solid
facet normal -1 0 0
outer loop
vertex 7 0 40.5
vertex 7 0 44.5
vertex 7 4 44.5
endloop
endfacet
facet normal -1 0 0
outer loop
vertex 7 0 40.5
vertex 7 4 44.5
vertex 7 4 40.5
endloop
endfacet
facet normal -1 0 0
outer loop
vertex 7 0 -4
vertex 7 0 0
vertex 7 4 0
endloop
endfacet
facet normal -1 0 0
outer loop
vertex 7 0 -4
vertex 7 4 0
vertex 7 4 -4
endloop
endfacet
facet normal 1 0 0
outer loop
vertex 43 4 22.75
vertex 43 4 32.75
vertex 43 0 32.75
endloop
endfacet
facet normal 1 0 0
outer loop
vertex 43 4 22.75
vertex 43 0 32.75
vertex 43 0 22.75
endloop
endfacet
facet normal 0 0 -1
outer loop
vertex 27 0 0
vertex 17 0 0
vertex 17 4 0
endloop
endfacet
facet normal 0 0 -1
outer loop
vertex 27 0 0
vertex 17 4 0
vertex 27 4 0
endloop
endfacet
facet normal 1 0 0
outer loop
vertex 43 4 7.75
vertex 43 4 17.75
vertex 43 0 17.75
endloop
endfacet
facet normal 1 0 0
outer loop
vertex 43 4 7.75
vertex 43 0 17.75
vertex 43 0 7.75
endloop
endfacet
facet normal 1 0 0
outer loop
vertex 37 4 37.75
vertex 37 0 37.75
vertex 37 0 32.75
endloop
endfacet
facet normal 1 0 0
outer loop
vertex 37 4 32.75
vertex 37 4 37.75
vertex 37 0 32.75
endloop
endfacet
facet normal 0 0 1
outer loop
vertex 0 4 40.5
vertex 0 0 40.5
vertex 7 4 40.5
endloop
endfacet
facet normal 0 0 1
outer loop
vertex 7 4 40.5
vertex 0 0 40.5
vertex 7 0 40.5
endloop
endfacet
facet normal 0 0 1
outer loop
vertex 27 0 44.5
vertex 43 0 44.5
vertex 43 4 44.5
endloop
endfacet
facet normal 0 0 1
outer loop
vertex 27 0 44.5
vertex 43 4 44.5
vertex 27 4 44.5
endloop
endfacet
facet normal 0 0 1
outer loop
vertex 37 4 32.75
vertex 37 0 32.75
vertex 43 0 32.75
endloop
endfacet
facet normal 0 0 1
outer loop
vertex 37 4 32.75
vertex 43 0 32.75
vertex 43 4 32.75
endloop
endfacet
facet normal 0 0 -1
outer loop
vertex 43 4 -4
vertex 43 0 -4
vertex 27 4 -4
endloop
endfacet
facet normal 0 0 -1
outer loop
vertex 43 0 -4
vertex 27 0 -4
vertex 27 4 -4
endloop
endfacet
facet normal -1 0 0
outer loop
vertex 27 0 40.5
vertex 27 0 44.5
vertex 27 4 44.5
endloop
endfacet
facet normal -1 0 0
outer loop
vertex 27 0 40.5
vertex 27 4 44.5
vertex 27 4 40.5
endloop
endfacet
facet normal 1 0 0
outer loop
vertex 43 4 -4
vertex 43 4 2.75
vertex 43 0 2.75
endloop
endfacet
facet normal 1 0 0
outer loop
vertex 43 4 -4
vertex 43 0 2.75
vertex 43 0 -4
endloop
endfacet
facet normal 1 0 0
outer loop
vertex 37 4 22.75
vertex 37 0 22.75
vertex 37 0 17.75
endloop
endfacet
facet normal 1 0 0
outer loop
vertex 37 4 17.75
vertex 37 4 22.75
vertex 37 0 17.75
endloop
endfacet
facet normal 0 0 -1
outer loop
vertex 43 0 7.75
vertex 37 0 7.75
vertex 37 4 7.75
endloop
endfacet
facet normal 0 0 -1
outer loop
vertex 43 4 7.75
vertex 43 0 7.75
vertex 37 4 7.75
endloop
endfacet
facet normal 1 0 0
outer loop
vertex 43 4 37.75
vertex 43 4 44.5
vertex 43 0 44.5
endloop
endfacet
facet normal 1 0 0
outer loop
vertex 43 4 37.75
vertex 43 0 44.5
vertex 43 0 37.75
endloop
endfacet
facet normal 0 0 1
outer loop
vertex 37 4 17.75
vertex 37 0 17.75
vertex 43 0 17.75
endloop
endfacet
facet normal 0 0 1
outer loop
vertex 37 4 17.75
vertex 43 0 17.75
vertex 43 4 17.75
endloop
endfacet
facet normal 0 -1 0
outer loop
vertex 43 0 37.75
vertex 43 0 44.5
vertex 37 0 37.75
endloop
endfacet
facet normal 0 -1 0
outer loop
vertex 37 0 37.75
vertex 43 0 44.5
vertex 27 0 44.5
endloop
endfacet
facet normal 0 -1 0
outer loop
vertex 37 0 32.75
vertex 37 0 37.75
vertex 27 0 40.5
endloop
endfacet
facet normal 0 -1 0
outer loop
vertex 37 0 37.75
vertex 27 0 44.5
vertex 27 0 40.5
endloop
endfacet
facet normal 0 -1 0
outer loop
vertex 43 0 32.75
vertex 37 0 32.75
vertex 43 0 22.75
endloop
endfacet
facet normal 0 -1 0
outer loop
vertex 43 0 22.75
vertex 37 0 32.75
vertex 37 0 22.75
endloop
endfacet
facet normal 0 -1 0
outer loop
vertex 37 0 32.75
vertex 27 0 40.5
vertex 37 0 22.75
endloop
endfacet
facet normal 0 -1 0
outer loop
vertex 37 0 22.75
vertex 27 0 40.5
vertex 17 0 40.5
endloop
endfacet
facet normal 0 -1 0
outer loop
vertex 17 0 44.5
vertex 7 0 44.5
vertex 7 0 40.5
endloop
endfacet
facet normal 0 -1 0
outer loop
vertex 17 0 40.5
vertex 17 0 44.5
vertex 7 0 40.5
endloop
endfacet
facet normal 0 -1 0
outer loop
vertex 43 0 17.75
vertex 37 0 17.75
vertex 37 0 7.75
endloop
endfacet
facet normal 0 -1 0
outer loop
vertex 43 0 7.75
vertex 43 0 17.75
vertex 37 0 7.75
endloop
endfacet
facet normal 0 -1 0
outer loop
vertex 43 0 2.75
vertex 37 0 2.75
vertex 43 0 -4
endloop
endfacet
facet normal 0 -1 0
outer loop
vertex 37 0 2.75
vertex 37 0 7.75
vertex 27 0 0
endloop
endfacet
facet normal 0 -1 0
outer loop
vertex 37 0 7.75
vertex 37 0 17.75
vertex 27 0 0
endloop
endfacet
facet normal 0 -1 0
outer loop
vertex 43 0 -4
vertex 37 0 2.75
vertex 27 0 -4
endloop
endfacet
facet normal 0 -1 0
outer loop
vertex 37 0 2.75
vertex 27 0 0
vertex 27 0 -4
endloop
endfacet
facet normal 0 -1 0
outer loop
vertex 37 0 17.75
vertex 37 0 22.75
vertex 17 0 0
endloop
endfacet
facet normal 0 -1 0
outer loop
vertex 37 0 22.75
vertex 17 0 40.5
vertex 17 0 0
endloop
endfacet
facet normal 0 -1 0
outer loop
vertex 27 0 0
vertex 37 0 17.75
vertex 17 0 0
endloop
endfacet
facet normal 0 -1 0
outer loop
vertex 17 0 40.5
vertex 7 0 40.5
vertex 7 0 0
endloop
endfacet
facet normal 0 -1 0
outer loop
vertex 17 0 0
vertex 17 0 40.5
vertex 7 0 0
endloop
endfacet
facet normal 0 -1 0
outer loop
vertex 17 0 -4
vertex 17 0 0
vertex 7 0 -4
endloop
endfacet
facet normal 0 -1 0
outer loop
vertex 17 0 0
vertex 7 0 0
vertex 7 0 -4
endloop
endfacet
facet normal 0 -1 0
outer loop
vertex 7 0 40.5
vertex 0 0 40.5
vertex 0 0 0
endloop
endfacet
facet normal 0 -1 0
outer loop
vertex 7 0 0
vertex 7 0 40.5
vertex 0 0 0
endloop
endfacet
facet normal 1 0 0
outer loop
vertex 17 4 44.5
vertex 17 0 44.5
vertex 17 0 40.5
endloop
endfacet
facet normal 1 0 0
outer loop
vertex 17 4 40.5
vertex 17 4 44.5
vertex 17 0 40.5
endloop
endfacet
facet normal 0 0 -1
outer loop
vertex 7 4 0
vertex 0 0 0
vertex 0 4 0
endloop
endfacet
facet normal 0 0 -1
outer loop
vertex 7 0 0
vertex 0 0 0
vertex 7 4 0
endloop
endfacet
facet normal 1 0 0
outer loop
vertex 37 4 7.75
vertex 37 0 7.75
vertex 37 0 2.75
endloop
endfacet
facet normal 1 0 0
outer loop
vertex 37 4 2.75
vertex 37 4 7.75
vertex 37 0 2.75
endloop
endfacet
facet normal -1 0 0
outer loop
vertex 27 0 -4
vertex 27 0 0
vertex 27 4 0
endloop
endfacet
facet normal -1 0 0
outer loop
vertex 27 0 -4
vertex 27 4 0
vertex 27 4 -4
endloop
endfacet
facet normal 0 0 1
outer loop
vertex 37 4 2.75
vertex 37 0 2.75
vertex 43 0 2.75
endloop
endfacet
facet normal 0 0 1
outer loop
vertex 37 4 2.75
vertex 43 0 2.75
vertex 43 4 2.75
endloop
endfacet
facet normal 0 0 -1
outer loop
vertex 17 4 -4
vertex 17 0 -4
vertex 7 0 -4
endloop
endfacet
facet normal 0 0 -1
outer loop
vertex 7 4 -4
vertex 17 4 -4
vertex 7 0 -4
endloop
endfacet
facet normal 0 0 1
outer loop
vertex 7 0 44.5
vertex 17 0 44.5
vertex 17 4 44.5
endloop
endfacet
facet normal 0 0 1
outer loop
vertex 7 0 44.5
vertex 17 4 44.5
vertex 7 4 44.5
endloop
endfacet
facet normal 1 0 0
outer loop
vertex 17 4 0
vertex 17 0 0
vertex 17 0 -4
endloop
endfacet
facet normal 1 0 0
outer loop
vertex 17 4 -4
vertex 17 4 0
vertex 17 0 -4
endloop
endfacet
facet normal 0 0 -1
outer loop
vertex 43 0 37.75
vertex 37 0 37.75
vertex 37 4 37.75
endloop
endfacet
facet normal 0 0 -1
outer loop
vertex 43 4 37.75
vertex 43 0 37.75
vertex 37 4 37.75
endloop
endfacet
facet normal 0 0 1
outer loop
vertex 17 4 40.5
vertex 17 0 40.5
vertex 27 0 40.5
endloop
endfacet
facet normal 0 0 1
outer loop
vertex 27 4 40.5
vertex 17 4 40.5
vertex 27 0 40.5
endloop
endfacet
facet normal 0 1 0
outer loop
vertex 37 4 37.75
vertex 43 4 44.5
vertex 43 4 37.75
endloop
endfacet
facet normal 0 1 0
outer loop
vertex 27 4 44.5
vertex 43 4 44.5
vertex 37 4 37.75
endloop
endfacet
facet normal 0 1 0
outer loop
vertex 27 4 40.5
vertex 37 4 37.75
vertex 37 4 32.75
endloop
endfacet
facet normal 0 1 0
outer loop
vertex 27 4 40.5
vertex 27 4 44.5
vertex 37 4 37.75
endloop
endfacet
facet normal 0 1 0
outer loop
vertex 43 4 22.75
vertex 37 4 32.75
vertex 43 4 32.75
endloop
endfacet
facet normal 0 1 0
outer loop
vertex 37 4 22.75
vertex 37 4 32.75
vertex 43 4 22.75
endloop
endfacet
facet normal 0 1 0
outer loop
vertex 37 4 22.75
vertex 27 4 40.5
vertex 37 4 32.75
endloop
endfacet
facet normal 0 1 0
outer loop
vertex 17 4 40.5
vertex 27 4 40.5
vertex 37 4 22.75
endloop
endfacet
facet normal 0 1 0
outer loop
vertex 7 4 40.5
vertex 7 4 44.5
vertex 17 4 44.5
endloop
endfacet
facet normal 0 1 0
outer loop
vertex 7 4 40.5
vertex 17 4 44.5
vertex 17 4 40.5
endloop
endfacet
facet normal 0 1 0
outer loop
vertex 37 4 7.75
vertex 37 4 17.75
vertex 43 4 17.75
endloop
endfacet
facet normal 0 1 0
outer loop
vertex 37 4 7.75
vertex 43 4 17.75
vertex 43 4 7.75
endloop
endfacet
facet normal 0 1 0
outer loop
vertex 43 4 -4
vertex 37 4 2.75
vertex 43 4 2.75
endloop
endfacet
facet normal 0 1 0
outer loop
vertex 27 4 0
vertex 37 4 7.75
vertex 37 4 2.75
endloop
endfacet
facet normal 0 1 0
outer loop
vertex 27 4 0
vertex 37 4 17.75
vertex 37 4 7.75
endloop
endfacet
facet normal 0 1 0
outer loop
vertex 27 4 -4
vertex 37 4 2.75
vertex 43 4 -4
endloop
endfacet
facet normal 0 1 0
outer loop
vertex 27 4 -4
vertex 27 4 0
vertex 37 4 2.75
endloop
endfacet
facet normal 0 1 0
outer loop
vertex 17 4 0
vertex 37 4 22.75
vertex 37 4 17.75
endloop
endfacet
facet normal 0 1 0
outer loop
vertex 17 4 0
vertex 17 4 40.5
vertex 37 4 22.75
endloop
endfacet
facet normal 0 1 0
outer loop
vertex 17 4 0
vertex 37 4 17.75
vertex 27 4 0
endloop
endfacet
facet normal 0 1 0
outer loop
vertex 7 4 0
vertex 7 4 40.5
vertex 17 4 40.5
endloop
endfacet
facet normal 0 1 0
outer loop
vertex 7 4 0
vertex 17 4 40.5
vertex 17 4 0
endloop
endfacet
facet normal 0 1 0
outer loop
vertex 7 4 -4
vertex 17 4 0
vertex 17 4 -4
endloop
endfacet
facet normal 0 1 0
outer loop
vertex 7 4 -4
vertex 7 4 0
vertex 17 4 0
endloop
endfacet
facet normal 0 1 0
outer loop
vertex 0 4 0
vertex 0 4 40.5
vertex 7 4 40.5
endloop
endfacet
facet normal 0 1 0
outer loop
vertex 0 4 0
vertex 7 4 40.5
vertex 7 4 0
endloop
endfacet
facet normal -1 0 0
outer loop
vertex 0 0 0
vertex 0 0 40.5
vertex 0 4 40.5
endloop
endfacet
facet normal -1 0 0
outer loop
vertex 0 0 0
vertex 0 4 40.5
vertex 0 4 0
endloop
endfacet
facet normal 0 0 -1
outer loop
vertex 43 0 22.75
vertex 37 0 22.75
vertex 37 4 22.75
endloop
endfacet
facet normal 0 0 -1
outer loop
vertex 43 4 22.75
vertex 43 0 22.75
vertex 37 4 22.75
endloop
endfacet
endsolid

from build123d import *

# Parameters (mm, degrees)
SKETCH1_W           = 37
SKETCH1_H           = 40.5
BOSS_EXTRUDE1_DEPTH = 4
SKETCH2_W           = 10
SKETCH2_H           = 4
BOSS_EXTRUDE2_DEPTH = 4
LPATTERN1_COUNT     = 2
LPATTERN1_PITCH     = 20
SKETCH3_W           = 6.75
SKETCH3_H           = 4
SKETCH3_W_2         = 10
BOSS_EXTRUDE3_DEPTH = 6


with BuildPart() as part:
    # Sketch1 → Boss-Extrude1 (new body)
    with BuildSketch(Plane(origin=(0, 0, 0), x_dir=(1, 0, 0), z_dir=(0, 1, 0))):
        with Locations((18.5, -20.25)):
            Rectangle(SKETCH1_W, SKETCH1_H)
    extrude(amount=BOSS_EXTRUDE1_DEPTH)

    # Sketch2 → Boss-Extrude2 (add, through all)
    with BuildSketch(Plane(origin=(0, 0, 0), x_dir=(-1, 0, 0), z_dir=(0, -1, 0))):
        with Locations((-32, 2)):
            Rectangle(SKETCH2_W, SKETCH2_H)
        with Locations((-32, -42.5)):
            Rectangle(SKETCH2_W, SKETCH2_H)
    boss_extrude2 = extrude(amount=-BOSS_EXTRUDE2_DEPTH)

    # LPattern1: Boss-Extrude2 ×2
    with Locations(*[(-i * LPATTERN1_PITCH, 0, 0) for i in range(1, LPATTERN1_COUNT)]):
        add(boss_extrude2)

    # Sketch3 → Boss-Extrude3 (add)
    with BuildSketch(Plane(origin=(37, 0, 0), x_dir=(0, 0, -1), z_dir=(1, 0, 0))):
        with Locations((0.625, 2)):
            Rectangle(SKETCH3_W, SKETCH3_H)
        with Locations((-12.75, 2)):
            Rectangle(SKETCH3_W_2, SKETCH3_H)
        with Locations((-27.75, 2)):
            Rectangle(SKETCH3_W_2, SKETCH3_H)
        with Locations((-41.125, 2)):
            Rectangle(SKETCH3_W, SKETCH3_H)
    extrude(amount=BOSS_EXTRUDE3_DEPTH)


solid = part.part
